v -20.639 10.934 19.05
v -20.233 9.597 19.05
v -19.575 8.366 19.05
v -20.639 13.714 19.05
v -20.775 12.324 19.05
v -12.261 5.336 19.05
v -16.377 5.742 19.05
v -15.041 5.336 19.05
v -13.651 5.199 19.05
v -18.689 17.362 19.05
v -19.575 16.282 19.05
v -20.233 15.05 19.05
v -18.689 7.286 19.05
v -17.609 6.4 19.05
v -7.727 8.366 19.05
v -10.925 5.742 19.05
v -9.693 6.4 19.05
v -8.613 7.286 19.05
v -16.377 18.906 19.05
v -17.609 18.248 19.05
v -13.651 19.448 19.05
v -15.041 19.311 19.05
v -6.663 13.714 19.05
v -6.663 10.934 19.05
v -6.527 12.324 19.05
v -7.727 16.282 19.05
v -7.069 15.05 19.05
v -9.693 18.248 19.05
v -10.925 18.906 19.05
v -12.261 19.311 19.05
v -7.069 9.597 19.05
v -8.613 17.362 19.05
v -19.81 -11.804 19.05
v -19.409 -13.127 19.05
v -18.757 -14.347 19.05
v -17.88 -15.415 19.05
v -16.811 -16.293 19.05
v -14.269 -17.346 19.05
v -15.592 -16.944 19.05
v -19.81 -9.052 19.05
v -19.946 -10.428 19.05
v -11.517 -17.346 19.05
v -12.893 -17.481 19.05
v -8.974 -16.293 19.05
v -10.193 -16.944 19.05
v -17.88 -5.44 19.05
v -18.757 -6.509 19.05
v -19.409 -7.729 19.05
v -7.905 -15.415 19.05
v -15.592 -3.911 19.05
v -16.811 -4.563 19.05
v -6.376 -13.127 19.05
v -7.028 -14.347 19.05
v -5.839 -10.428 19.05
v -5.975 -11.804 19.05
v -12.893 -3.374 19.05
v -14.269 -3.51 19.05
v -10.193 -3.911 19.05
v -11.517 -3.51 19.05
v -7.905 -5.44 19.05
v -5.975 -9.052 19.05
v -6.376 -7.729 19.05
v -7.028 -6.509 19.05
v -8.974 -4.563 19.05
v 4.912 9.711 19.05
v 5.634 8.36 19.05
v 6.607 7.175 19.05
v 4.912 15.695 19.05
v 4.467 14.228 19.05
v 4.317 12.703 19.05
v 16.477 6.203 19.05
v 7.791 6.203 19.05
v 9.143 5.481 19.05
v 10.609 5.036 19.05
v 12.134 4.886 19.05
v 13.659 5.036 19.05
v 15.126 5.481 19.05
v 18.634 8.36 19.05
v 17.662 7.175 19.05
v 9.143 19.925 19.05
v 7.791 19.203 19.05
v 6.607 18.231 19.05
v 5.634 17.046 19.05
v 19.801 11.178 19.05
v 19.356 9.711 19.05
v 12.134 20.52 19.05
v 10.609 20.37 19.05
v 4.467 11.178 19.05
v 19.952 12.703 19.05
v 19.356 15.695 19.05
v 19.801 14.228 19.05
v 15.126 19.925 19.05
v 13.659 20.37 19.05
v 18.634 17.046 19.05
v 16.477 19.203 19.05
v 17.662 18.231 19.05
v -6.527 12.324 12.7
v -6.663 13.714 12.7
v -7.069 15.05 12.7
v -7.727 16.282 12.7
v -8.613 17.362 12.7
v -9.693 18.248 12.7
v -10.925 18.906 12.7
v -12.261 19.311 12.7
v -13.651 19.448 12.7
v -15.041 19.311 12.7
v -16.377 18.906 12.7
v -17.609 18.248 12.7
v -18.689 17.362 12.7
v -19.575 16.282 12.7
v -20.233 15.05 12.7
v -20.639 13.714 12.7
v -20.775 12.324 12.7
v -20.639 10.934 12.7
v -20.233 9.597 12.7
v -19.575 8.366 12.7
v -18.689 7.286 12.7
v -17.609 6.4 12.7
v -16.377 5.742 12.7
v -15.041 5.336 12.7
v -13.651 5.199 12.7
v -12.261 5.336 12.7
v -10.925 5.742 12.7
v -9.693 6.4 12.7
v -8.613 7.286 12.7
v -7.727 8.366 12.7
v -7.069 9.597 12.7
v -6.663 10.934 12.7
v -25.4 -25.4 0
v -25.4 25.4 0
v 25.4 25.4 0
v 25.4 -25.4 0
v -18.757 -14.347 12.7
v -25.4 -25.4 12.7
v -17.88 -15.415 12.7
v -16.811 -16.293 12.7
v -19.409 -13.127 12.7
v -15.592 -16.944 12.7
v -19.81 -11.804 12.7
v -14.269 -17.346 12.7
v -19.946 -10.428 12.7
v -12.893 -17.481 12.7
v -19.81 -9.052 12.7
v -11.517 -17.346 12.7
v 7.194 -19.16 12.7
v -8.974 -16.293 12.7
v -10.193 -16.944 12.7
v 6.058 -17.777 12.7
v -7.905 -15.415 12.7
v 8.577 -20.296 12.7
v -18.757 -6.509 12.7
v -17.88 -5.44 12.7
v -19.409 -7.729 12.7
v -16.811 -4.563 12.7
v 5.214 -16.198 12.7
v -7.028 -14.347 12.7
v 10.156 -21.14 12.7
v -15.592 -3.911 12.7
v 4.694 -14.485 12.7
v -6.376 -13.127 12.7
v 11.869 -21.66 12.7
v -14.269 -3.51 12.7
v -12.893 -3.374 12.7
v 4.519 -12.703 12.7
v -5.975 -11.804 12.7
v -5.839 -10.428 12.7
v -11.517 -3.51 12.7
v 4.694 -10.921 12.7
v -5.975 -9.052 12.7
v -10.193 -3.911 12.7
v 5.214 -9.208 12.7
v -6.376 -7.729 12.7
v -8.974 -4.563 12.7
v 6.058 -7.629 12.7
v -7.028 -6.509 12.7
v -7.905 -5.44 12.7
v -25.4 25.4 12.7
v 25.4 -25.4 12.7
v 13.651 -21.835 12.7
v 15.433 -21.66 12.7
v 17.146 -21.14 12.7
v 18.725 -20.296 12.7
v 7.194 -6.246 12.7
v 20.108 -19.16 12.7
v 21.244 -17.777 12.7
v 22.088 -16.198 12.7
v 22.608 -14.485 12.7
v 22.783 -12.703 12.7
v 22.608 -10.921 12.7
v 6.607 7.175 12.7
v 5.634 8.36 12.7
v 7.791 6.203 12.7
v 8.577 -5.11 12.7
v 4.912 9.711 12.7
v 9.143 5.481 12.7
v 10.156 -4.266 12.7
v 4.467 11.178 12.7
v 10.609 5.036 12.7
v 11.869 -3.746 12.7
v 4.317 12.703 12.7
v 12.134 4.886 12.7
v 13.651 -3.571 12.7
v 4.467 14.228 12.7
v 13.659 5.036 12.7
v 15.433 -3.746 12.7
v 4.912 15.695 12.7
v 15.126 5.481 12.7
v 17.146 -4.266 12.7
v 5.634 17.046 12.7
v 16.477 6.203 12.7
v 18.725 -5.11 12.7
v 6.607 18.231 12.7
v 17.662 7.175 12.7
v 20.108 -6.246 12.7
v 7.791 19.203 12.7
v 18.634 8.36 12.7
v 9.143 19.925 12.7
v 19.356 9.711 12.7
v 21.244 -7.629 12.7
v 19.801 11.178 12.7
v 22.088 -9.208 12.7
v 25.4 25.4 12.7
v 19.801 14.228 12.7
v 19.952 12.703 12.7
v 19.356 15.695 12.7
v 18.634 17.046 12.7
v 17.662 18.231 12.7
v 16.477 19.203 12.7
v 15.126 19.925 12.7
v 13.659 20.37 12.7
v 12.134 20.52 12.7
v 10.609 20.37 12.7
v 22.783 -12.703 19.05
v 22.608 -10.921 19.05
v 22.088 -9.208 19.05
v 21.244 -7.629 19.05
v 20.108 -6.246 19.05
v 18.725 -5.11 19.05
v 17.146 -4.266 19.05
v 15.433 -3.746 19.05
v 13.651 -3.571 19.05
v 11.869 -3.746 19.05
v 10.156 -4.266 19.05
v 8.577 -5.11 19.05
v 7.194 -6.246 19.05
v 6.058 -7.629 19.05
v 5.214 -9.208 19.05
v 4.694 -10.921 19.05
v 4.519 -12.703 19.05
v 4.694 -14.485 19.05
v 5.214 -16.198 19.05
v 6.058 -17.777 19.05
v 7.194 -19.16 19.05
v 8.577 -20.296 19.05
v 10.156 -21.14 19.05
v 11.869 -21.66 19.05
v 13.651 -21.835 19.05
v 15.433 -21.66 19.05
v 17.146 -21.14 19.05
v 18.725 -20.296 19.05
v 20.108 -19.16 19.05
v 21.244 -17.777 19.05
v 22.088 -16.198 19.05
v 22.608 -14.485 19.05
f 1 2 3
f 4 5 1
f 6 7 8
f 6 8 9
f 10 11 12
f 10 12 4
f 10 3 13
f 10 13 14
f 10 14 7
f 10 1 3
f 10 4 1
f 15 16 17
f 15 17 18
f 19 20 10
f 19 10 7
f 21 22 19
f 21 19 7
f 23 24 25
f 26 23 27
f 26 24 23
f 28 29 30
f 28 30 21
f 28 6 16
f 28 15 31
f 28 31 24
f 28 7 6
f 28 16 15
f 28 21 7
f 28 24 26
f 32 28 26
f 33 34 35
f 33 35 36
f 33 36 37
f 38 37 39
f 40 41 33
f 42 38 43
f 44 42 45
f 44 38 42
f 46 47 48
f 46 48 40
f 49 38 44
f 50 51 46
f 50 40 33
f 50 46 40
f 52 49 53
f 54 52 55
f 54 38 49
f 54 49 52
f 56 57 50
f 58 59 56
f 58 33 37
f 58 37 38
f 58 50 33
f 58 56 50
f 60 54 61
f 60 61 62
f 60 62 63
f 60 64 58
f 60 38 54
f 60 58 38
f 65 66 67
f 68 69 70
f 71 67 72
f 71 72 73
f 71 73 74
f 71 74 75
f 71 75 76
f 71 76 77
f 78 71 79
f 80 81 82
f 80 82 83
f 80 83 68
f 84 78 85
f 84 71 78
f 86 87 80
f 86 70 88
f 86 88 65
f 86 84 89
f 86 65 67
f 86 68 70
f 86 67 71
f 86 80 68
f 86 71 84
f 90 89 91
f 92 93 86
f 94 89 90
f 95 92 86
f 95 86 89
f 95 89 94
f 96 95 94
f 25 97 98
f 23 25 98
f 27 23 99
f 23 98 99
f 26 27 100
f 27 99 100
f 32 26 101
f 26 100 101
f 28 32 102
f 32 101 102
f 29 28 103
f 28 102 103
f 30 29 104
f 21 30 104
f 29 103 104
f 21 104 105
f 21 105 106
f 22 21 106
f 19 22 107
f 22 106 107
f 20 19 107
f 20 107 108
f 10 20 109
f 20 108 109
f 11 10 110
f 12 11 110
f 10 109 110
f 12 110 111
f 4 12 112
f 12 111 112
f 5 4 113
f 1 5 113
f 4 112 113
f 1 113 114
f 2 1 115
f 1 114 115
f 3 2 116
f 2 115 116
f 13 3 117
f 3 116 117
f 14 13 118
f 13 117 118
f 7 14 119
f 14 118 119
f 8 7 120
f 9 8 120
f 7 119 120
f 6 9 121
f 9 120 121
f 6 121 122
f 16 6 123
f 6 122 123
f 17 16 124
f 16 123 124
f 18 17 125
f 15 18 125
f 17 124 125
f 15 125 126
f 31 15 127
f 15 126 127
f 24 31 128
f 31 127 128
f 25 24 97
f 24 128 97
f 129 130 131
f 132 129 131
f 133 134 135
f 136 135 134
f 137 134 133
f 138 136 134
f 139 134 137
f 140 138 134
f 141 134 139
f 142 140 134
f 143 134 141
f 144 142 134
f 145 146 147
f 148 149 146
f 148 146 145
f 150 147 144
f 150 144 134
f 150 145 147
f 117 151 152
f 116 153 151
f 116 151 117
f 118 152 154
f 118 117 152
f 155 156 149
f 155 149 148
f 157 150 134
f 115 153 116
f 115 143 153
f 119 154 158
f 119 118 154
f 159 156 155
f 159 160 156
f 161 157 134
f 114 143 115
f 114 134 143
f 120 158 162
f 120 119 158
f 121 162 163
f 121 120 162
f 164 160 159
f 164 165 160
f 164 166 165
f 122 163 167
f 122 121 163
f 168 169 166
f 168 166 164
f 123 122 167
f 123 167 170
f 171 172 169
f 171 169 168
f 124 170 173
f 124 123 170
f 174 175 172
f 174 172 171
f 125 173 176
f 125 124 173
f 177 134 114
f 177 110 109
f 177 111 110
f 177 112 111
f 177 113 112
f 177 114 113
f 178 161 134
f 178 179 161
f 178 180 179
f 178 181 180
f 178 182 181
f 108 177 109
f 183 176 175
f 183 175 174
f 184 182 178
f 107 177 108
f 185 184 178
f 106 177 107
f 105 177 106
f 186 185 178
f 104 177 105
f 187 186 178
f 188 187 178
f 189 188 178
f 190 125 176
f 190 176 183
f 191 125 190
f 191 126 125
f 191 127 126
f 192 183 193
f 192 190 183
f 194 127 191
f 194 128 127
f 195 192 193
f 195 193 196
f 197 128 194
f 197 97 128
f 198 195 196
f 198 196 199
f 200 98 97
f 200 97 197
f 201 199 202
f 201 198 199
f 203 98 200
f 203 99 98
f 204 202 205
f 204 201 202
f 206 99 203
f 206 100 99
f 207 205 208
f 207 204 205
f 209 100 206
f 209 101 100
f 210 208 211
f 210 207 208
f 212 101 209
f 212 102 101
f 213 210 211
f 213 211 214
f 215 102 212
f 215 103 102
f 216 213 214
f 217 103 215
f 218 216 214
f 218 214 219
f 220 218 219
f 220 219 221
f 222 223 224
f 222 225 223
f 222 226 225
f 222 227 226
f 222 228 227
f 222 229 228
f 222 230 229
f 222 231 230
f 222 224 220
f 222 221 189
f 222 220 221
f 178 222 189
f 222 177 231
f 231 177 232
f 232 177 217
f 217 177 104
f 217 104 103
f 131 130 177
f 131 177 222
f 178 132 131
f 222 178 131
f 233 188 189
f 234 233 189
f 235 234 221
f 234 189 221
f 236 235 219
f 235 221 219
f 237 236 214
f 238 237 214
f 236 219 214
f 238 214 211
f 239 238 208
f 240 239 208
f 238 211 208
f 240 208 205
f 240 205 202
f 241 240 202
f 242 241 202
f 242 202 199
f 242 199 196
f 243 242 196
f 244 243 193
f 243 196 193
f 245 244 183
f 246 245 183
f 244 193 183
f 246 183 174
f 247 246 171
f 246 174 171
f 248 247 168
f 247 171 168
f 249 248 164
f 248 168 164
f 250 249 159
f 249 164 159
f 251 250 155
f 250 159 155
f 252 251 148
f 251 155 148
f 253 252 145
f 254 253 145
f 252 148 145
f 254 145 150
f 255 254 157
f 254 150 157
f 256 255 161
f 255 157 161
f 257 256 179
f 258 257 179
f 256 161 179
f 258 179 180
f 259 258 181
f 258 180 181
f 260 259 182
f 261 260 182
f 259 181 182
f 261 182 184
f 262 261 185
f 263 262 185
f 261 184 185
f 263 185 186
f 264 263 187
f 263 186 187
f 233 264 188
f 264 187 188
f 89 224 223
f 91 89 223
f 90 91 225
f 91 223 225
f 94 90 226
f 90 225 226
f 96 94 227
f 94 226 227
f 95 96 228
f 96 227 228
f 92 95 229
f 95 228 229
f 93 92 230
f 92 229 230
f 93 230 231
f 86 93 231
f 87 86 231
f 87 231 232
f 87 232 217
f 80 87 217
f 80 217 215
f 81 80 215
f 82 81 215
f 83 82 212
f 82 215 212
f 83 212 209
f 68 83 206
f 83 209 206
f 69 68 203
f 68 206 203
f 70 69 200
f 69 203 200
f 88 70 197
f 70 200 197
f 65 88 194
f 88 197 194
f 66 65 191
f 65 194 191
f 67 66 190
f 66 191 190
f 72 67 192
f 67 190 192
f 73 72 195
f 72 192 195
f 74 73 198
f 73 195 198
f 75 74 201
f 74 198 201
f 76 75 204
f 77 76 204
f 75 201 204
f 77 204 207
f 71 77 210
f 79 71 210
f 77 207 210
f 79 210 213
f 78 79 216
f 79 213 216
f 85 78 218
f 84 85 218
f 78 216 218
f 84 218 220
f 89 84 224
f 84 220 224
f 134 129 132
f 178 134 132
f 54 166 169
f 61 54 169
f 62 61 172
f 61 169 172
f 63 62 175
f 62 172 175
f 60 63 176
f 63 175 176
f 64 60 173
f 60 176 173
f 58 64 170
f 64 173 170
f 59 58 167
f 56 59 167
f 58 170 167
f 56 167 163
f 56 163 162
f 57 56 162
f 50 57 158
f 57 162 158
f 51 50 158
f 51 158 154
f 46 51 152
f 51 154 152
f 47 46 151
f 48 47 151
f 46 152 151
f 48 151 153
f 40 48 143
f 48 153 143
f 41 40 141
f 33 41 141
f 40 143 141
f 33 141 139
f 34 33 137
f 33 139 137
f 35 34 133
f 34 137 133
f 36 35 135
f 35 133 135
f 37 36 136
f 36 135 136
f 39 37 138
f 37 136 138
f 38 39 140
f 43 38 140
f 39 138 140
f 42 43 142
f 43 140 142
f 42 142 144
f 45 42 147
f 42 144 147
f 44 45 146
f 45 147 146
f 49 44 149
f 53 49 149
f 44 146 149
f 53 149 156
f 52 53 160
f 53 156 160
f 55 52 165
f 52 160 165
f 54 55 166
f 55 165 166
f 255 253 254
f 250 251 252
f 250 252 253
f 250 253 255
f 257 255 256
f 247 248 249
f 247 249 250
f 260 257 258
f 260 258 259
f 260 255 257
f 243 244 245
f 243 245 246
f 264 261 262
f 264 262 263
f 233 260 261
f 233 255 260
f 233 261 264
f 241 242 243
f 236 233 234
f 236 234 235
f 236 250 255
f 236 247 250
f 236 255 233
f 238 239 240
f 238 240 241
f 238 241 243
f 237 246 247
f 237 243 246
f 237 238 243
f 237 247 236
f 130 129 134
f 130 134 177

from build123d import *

# Parameters (mm, degrees)
F0_W     = 50.8
F0_H     = 50.8
F1_DEPTH = 12.7
F2_R     = 7.124416
F3_DEPTH = 6.35
F2_R_2   = 7.81729
F4_DEPTH = 6.35
F2_R_3   = 7.053422
F5_DEPTH = 6.35
F2_R_4   = 9.132211
F6_DEPTH = 6.35


with BuildPart() as f1:
    # F0 (on Top) → F1 (new body)
    with BuildSketch(Plane.XY):
        Rectangle(F0_W, F0_H)
    extrude(amount=F1_DEPTH)

    # F2 (on face) → F3 (join)
    with BuildSketch(Plane.XY.offset(12.7)):
        with Locations((-13.650993, 12.323814)):
            Circle(F2_R)
    extrude(amount=F3_DEPTH)

    # F2 (on face) → F4 (join)
    with BuildSketch(Plane.XY.offset(12.7)):
        with Locations((12.134215, 12.703009)):
            Circle(F2_R_2)
    extrude(amount=F4_DEPTH)

    # F2 (on face) → F5 (join)
    with BuildSketch(Plane.XY.offset(12.7)):
        with Locations((-12.892607, -10.427844)):
            Circle(F2_R_3)
    extrude(amount=F5_DEPTH)

    # F2 (on face) → F6 (join)
    with BuildSketch(Plane.XY.offset(12.7)):
        with Locations((13.650997, -12.703009)):
            Circle(F2_R_4)
    extrude(amount=F6_DEPTH)


solid = f1.part
